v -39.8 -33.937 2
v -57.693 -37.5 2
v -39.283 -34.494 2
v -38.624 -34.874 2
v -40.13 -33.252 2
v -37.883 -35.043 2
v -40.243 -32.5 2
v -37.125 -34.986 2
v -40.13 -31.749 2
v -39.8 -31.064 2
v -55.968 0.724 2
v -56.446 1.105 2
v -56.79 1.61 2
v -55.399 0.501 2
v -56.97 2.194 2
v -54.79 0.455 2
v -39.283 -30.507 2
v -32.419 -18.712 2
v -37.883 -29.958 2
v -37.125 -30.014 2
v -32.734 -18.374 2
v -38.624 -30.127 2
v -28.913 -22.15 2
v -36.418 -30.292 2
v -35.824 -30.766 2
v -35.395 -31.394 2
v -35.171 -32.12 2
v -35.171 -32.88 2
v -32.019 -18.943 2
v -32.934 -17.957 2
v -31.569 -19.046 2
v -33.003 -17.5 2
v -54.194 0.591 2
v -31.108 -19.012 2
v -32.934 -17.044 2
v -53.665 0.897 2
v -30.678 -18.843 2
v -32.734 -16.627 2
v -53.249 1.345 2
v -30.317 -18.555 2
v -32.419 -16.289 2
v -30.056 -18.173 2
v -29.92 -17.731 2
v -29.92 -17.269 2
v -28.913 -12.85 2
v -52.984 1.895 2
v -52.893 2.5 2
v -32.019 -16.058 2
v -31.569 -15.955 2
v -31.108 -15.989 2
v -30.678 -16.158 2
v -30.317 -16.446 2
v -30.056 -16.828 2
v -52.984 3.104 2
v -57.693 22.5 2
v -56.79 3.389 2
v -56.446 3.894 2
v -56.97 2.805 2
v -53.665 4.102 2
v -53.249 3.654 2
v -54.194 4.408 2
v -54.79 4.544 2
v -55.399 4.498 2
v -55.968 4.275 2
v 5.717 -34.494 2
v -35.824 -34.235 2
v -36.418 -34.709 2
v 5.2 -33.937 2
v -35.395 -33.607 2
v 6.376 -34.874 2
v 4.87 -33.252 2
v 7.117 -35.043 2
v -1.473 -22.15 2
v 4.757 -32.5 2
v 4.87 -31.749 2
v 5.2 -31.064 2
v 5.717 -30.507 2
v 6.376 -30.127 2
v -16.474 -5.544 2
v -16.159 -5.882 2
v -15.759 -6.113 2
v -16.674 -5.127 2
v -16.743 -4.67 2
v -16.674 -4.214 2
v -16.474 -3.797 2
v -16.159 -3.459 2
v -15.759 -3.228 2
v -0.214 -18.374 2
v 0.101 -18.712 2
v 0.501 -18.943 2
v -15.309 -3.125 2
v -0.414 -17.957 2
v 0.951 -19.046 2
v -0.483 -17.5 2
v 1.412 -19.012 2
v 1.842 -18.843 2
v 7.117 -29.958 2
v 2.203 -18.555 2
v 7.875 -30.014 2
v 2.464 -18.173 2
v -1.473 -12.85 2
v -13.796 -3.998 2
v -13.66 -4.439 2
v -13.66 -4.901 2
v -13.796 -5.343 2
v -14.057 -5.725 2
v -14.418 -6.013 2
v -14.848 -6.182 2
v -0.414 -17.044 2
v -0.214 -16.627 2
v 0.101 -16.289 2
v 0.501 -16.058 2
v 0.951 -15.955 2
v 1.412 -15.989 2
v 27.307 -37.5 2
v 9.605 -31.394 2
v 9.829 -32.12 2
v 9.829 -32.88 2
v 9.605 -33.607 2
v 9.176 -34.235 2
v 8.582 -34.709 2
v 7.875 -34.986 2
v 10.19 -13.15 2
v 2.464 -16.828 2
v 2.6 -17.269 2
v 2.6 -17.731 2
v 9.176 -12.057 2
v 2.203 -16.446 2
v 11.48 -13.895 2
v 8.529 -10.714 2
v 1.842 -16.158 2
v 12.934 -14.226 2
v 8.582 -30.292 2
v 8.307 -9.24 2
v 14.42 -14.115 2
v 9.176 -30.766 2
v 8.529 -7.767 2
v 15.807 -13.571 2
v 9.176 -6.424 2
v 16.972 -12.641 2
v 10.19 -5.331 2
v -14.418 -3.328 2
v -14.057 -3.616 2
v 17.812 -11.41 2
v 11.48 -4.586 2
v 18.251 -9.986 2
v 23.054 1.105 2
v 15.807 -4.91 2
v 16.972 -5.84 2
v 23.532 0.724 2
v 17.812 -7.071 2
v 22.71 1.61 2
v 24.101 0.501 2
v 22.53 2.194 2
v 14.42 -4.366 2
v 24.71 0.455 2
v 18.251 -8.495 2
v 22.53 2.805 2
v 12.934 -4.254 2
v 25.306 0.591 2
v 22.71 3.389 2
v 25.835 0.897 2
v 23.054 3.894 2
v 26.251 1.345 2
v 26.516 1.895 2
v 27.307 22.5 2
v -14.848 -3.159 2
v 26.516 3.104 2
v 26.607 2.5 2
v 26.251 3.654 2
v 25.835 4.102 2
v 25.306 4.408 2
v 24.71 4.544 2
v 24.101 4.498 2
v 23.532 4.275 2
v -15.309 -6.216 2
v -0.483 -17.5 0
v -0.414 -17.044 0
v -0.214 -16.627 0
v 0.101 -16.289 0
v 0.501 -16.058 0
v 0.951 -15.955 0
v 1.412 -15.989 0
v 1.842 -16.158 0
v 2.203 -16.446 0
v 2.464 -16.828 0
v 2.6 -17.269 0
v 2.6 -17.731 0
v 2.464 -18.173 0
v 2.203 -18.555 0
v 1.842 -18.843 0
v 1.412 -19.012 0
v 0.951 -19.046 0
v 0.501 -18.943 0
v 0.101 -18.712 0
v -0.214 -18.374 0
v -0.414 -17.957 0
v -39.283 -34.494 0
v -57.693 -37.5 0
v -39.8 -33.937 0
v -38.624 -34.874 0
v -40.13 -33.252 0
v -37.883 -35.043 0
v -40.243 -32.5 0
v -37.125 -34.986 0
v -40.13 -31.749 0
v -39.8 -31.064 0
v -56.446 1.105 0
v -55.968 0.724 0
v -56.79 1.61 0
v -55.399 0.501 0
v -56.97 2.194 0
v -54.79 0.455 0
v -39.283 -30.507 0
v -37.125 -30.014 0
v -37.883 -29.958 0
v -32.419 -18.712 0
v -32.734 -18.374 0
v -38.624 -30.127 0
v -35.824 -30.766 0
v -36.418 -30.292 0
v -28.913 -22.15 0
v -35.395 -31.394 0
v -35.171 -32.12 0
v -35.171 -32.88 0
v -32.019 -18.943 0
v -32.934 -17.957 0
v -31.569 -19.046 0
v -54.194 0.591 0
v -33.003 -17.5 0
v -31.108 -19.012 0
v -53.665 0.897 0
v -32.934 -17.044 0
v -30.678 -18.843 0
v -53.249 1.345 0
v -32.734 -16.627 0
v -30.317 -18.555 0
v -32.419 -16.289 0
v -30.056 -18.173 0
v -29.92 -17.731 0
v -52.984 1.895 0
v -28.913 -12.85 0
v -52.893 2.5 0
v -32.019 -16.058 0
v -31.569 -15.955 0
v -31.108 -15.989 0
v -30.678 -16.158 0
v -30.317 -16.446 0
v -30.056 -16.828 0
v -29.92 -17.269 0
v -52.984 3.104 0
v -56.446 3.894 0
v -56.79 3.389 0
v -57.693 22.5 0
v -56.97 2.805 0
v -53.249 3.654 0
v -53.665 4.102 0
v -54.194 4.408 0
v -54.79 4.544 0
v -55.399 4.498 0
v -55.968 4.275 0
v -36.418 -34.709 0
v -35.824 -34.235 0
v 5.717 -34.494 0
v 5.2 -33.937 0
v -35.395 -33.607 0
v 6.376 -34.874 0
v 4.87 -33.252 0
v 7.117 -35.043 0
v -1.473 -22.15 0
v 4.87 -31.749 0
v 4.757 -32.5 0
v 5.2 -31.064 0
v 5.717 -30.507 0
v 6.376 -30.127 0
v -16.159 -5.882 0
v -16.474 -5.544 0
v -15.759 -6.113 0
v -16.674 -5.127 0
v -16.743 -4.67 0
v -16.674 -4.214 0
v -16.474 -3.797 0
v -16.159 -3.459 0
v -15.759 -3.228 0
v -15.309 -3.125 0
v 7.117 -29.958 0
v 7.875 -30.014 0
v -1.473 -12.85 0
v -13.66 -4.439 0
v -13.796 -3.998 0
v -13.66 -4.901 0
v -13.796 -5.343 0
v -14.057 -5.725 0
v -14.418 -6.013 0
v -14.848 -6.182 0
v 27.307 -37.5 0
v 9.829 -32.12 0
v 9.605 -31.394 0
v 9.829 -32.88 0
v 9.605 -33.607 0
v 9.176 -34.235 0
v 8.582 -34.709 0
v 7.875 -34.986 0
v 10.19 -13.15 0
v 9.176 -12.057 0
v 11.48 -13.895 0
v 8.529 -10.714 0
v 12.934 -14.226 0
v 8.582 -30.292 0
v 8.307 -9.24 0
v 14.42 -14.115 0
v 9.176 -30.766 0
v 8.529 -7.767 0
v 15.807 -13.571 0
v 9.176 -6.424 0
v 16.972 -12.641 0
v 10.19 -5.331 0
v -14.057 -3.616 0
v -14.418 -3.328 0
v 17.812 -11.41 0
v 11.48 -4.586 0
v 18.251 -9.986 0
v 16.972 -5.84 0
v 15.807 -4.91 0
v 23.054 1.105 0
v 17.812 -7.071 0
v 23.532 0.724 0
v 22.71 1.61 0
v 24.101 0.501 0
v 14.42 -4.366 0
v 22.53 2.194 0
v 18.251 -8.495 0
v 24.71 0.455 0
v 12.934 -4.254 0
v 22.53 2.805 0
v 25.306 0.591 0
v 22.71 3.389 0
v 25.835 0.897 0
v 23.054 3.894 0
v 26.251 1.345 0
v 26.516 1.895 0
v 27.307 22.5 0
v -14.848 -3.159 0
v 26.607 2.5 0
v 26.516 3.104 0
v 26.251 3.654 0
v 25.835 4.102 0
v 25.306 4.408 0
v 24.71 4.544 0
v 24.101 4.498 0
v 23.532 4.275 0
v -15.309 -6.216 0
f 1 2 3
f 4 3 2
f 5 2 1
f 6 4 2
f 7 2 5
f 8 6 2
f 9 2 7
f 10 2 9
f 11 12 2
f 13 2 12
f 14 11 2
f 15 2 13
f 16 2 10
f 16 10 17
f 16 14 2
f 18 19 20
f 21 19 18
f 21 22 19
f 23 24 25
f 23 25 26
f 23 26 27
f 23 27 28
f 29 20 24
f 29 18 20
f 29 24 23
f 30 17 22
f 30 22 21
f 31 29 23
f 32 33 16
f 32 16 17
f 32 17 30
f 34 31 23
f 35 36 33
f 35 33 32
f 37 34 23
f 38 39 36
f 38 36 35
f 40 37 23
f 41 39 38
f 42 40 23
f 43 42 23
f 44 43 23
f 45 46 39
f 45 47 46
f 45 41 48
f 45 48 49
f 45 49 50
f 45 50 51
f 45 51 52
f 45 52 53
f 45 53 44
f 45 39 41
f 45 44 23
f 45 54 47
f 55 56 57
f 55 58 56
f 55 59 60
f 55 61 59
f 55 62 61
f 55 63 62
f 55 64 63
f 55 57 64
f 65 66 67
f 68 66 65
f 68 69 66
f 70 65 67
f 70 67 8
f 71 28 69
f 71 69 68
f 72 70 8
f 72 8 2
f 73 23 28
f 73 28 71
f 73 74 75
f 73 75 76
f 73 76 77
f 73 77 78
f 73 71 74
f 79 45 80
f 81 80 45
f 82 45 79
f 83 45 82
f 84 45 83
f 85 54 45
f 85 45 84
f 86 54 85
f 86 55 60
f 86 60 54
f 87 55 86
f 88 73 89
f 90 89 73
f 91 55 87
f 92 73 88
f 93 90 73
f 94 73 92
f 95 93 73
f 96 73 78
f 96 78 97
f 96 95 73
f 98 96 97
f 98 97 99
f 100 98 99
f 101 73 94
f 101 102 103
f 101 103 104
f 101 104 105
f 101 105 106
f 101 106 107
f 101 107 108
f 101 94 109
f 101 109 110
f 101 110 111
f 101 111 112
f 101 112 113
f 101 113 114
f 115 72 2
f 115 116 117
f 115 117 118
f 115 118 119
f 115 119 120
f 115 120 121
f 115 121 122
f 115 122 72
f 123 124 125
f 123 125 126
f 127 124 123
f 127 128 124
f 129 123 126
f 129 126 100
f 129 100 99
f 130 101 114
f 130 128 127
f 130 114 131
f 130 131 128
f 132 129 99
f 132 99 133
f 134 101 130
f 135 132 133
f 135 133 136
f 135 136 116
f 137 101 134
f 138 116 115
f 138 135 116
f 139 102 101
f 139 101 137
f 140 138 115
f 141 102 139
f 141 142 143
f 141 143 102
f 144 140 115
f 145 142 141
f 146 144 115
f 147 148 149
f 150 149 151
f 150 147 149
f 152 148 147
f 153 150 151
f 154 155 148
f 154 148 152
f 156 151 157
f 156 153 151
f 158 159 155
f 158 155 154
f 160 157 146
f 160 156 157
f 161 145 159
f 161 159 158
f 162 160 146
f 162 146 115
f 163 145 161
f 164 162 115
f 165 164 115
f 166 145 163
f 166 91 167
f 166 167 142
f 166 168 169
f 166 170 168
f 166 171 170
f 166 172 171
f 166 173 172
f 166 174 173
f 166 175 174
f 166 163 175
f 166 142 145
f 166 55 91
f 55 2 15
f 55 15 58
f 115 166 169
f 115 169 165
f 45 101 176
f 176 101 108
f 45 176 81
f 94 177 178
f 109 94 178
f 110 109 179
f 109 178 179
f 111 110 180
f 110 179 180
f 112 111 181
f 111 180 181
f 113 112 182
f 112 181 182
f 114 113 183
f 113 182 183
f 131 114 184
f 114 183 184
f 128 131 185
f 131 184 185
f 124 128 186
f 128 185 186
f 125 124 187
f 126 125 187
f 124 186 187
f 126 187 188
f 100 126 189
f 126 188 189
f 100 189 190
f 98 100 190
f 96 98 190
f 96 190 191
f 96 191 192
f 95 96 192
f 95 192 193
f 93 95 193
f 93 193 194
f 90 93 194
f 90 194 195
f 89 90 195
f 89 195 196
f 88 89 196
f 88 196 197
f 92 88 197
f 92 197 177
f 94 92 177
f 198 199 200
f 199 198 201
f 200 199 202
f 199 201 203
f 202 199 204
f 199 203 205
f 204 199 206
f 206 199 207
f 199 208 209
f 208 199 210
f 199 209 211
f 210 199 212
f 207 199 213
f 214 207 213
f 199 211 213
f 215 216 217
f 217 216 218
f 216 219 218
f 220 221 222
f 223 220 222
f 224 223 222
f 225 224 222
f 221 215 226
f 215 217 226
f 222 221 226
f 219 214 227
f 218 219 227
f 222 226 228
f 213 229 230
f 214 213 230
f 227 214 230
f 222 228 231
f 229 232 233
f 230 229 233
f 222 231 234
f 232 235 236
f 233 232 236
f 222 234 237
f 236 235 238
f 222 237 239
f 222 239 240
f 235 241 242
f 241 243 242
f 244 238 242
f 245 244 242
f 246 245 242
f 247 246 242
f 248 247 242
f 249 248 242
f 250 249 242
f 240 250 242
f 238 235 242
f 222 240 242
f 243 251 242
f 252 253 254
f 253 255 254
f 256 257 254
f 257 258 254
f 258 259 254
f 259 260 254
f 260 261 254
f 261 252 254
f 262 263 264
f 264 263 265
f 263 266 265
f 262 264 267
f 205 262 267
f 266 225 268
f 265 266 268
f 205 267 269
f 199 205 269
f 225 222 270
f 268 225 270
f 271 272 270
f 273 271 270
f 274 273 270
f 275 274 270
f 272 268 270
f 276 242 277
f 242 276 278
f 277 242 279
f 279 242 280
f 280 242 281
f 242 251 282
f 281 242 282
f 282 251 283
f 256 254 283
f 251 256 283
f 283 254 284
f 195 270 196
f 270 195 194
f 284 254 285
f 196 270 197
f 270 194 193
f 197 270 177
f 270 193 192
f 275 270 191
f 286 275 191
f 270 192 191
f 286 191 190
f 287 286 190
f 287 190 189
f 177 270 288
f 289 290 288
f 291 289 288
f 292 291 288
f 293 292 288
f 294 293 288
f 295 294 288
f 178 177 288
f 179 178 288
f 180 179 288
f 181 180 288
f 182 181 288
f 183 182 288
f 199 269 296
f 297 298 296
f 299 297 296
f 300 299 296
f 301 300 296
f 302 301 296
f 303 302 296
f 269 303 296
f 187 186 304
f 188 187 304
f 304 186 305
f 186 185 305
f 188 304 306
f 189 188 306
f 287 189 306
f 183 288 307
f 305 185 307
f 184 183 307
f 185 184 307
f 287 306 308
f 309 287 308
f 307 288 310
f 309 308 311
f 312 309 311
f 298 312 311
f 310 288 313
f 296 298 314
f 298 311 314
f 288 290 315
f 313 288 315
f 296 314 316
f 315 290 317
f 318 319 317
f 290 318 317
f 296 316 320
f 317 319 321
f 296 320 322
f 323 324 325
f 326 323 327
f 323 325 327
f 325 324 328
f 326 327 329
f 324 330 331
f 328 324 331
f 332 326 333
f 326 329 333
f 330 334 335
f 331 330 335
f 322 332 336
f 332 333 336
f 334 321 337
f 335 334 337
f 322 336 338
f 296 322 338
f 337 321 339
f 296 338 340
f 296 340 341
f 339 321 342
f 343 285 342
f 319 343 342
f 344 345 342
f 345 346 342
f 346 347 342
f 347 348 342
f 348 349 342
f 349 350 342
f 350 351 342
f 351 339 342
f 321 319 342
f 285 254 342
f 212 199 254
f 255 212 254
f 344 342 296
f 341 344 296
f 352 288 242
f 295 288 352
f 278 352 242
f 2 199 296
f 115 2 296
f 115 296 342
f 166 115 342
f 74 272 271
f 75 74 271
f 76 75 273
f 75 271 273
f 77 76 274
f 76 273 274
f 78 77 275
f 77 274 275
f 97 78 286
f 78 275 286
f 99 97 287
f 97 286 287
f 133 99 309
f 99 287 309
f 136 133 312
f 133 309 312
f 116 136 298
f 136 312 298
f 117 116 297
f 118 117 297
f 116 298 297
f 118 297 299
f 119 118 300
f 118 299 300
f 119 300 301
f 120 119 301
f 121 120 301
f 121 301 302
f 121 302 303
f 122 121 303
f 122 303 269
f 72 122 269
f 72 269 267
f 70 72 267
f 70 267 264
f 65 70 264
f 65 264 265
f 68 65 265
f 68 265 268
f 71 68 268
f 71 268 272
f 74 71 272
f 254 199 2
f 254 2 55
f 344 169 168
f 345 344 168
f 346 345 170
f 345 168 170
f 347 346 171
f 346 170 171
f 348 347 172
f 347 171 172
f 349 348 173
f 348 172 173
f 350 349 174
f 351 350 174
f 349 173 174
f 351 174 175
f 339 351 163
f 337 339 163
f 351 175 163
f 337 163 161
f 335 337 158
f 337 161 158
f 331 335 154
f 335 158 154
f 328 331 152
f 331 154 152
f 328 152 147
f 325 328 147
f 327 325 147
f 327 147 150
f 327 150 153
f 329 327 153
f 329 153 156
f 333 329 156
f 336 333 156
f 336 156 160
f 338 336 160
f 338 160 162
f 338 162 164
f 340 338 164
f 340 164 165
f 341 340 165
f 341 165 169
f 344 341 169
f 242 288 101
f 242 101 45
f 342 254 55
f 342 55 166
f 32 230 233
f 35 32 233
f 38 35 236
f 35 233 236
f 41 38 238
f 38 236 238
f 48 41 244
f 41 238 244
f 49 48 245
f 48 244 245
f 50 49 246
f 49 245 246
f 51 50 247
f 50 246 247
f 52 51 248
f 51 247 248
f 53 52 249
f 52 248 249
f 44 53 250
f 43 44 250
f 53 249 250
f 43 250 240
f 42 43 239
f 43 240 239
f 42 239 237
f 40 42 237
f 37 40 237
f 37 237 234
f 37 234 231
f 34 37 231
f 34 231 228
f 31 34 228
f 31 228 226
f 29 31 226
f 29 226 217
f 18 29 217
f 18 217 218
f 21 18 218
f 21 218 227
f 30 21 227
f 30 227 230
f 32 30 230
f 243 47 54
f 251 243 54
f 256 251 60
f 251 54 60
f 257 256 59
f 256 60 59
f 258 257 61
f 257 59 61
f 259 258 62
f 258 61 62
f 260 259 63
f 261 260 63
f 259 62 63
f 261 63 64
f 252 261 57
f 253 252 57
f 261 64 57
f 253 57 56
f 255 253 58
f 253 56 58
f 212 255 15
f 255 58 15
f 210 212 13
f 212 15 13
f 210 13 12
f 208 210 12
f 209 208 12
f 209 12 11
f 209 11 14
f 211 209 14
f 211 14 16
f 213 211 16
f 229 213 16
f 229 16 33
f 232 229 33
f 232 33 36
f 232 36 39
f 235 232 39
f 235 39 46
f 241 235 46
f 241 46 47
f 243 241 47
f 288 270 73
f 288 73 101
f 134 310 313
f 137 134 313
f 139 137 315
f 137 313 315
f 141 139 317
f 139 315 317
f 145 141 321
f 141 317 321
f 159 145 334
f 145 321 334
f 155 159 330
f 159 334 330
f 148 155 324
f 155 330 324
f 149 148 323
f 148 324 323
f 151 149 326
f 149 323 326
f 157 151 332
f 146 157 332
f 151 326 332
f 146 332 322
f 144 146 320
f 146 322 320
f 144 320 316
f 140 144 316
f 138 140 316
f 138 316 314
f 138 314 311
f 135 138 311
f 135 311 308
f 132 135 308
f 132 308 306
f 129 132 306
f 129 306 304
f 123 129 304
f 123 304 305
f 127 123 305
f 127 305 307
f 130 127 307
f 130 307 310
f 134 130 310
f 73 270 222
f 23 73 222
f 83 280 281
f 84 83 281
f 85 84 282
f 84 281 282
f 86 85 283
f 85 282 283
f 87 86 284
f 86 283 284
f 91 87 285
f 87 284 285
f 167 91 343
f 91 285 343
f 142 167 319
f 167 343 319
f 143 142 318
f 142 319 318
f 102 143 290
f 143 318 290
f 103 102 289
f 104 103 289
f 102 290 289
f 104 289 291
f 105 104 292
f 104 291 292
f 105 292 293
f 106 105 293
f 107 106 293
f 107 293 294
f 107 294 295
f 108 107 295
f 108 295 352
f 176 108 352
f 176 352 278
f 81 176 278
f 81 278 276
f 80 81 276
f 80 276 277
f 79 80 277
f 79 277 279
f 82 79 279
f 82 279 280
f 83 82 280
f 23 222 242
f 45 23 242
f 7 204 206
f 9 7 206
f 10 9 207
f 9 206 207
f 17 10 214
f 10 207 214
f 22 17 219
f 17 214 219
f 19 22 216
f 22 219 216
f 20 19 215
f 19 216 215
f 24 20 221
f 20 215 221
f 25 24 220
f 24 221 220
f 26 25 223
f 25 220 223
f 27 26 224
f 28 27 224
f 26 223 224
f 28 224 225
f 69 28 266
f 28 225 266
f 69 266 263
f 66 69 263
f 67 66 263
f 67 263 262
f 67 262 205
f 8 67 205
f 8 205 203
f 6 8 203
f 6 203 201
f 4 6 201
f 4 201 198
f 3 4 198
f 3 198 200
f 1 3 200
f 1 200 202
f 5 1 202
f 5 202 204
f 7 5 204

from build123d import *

# Parameters (mm, degrees)
SKETCH1_W           = 85
SKETCH1_H           = 60
BOSS_EXTRUDE1_DEPTH = 2
CUT_EXTRUDE1_REACH  = 4
SKETCH2_R           = 2.55
CUT_EXTRUDE2_REACH  = 4
SKETCH3_R           = 5
SKETCH3_R_2         = 1.55
SKETCH3_W           = 27.44
SKETCH3_H           = 9.3
CUT_EXTRUDE3_REACH  = 4
SKETCH4_R           = 2.05


with BuildPart() as part:
    # Sketch1 → Boss-Extrude1 (new body)
    with BuildSketch(Plane.XY):
        with Locations((-15.192849494, -7.500433728)):
            Rectangle(SKETCH1_W, SKETCH1_H)
    extrude(amount=BOSS_EXTRUDE1_DEPTH)

    # Sketch2 → Cut-Extrude1 (cut, up to next)
    with BuildSketch(Plane(origin=(0, 0, 0), x_dir=(-1, 0, 0), z_dir=(0, 0, -1)), mode=Mode.PRIVATE) as cut_extrude1_sk1:
        with Locations((-7.307150506, -32.500433728)):
            Circle(SKETCH2_R)
    cut_extrude1_tool1 = extrude(cut_extrude1_sk1.sketch, amount=-CUT_EXTRUDE1_REACH, mode=Mode.PRIVATE) & part.part
    add(cut_extrude1_tool1.solids().sort_by_distance((7.307151, -32.500434, 0))[0], mode=Mode.SUBTRACT)
    # Sketch2 → Cut-Extrude1 (cut, up to next)
    with BuildSketch(Plane(origin=(0, 0, 0), x_dir=(-1, 0, 0), z_dir=(0, 0, -1)), mode=Mode.PRIVATE) as cut_extrude1_sk2:
        with Locations((37.692849494, -32.500433728)):
            Circle(SKETCH2_R)
    cut_extrude1_tool2 = extrude(cut_extrude1_sk2.sketch, amount=-CUT_EXTRUDE1_REACH, mode=Mode.PRIVATE) & part.part
    add(cut_extrude1_tool2.solids().sort_by_distance((-37.692849, -32.500434, 0))[0], mode=Mode.SUBTRACT)

    # Sketch3 → Cut-Extrude2 (cut, up to next)
    with BuildSketch(Plane(origin=(0, 0, 0), x_dir=(-1, 0, 0), z_dir=(0, 0, -1)), mode=Mode.PRIVATE) as cut_extrude2_sk1:
        with Locations((-13.307150506, -9.240433728)):
            Circle(SKETCH3_R)
    cut_extrude2_tool1 = extrude(cut_extrude2_sk1.sketch, amount=-CUT_EXTRUDE2_REACH, mode=Mode.PRIVATE) & part.part
    add(cut_extrude2_tool1.solids().sort_by_distance((13.307151, -9.240434, 0))[0], mode=Mode.SUBTRACT)
    # Sketch3 → Cut-Extrude2 (cut, up to next)
    with BuildSketch(Plane(origin=(0, 0, 0), x_dir=(-1, 0, 0), z_dir=(0, 0, -1)), mode=Mode.PRIVATE) as cut_extrude2_sk2:
        with Locations((15.192849494, -4.670433728)):
            Circle(SKETCH3_R_2)
    cut_extrude2_tool2 = extrude(cut_extrude2_sk2.sketch, amount=-CUT_EXTRUDE2_REACH, mode=Mode.PRIVATE) & part.part
    add(cut_extrude2_tool2.solids().sort_by_distance((-15.192849, -4.670434, 0))[0], mode=Mode.SUBTRACT)
    # Sketch3 → Cut-Extrude2 (cut, up to next)
    with BuildSketch(Plane(origin=(0, 0, 0), x_dir=(-1, 0, 0), z_dir=(0, 0, -1)), mode=Mode.PRIVATE) as cut_extrude2_sk3:
        with Locations((-1.067150506, -17.500433728)):
            Circle(SKETCH3_R_2)
    cut_extrude2_tool3 = extrude(cut_extrude2_sk3.sketch, amount=-CUT_EXTRUDE2_REACH, mode=Mode.PRIVATE) & part.part
    add(cut_extrude2_tool3.solids().sort_by_distance((1.067151, -17.500434, 0))[0], mode=Mode.SUBTRACT)
    # Sketch3 → Cut-Extrude2 (cut, up to next)
    with BuildSketch(Plane(origin=(0, 0, 0), x_dir=(-1, 0, 0), z_dir=(0, 0, -1)), mode=Mode.PRIVATE) as cut_extrude2_sk4:
        with Locations((31.452849494, -17.500433728)):
            Circle(SKETCH3_R_2)
    cut_extrude2_tool4 = extrude(cut_extrude2_sk4.sketch, amount=-CUT_EXTRUDE2_REACH, mode=Mode.PRIVATE) & part.part
    add(cut_extrude2_tool4.solids().sort_by_distance((-31.452849, -17.500434, 0))[0], mode=Mode.SUBTRACT)
    # Sketch3 → Cut-Extrude2 (cut, up to next)
    with BuildSketch(Plane(origin=(0, 0, 0), x_dir=(-1, 0, 0), z_dir=(0, 0, -1)), mode=Mode.PRIVATE) as cut_extrude2_sk5:
        with Locations((15.192849494, -17.500433728)):
            Rectangle(SKETCH3_W, SKETCH3_H)
    cut_extrude2_tool5 = extrude(cut_extrude2_sk5.sketch, amount=-CUT_EXTRUDE2_REACH, mode=Mode.PRIVATE) & part.part
    add(cut_extrude2_tool5.solids().sort_by_distance((-15.192849, -17.500434, 0))[0], mode=Mode.SUBTRACT)

    # Sketch4 → Cut-Extrude3 (cut, up to next)
    with BuildSketch(Plane.XY.offset(2), mode=Mode.PRIVATE) as cut_extrude3_sk1:
        with Locations((-54.942849494, 2.499566272)):
            Circle(SKETCH4_R)
    cut_extrude3_tool1 = extrude(cut_extrude3_sk1.sketch, amount=-CUT_EXTRUDE3_REACH, mode=Mode.PRIVATE) & part.part
    add(cut_extrude3_tool1.solids().sort_by_distance((-54.942849, 2.499566, 2))[0], mode=Mode.SUBTRACT)
    # Sketch4 → Cut-Extrude3 (cut, up to next)
    with BuildSketch(Plane.XY.offset(2), mode=Mode.PRIVATE) as cut_extrude3_sk2:
        with Locations((24.557150506, 2.499566272)):
            Circle(SKETCH4_R)
    cut_extrude3_tool2 = extrude(cut_extrude3_sk2.sketch, amount=-CUT_EXTRUDE3_REACH, mode=Mode.PRIVATE) & part.part
    add(cut_extrude3_tool2.solids().sort_by_distance((24.557151, 2.499566, 2))[0], mode=Mode.SUBTRACT)


solid = part.part
